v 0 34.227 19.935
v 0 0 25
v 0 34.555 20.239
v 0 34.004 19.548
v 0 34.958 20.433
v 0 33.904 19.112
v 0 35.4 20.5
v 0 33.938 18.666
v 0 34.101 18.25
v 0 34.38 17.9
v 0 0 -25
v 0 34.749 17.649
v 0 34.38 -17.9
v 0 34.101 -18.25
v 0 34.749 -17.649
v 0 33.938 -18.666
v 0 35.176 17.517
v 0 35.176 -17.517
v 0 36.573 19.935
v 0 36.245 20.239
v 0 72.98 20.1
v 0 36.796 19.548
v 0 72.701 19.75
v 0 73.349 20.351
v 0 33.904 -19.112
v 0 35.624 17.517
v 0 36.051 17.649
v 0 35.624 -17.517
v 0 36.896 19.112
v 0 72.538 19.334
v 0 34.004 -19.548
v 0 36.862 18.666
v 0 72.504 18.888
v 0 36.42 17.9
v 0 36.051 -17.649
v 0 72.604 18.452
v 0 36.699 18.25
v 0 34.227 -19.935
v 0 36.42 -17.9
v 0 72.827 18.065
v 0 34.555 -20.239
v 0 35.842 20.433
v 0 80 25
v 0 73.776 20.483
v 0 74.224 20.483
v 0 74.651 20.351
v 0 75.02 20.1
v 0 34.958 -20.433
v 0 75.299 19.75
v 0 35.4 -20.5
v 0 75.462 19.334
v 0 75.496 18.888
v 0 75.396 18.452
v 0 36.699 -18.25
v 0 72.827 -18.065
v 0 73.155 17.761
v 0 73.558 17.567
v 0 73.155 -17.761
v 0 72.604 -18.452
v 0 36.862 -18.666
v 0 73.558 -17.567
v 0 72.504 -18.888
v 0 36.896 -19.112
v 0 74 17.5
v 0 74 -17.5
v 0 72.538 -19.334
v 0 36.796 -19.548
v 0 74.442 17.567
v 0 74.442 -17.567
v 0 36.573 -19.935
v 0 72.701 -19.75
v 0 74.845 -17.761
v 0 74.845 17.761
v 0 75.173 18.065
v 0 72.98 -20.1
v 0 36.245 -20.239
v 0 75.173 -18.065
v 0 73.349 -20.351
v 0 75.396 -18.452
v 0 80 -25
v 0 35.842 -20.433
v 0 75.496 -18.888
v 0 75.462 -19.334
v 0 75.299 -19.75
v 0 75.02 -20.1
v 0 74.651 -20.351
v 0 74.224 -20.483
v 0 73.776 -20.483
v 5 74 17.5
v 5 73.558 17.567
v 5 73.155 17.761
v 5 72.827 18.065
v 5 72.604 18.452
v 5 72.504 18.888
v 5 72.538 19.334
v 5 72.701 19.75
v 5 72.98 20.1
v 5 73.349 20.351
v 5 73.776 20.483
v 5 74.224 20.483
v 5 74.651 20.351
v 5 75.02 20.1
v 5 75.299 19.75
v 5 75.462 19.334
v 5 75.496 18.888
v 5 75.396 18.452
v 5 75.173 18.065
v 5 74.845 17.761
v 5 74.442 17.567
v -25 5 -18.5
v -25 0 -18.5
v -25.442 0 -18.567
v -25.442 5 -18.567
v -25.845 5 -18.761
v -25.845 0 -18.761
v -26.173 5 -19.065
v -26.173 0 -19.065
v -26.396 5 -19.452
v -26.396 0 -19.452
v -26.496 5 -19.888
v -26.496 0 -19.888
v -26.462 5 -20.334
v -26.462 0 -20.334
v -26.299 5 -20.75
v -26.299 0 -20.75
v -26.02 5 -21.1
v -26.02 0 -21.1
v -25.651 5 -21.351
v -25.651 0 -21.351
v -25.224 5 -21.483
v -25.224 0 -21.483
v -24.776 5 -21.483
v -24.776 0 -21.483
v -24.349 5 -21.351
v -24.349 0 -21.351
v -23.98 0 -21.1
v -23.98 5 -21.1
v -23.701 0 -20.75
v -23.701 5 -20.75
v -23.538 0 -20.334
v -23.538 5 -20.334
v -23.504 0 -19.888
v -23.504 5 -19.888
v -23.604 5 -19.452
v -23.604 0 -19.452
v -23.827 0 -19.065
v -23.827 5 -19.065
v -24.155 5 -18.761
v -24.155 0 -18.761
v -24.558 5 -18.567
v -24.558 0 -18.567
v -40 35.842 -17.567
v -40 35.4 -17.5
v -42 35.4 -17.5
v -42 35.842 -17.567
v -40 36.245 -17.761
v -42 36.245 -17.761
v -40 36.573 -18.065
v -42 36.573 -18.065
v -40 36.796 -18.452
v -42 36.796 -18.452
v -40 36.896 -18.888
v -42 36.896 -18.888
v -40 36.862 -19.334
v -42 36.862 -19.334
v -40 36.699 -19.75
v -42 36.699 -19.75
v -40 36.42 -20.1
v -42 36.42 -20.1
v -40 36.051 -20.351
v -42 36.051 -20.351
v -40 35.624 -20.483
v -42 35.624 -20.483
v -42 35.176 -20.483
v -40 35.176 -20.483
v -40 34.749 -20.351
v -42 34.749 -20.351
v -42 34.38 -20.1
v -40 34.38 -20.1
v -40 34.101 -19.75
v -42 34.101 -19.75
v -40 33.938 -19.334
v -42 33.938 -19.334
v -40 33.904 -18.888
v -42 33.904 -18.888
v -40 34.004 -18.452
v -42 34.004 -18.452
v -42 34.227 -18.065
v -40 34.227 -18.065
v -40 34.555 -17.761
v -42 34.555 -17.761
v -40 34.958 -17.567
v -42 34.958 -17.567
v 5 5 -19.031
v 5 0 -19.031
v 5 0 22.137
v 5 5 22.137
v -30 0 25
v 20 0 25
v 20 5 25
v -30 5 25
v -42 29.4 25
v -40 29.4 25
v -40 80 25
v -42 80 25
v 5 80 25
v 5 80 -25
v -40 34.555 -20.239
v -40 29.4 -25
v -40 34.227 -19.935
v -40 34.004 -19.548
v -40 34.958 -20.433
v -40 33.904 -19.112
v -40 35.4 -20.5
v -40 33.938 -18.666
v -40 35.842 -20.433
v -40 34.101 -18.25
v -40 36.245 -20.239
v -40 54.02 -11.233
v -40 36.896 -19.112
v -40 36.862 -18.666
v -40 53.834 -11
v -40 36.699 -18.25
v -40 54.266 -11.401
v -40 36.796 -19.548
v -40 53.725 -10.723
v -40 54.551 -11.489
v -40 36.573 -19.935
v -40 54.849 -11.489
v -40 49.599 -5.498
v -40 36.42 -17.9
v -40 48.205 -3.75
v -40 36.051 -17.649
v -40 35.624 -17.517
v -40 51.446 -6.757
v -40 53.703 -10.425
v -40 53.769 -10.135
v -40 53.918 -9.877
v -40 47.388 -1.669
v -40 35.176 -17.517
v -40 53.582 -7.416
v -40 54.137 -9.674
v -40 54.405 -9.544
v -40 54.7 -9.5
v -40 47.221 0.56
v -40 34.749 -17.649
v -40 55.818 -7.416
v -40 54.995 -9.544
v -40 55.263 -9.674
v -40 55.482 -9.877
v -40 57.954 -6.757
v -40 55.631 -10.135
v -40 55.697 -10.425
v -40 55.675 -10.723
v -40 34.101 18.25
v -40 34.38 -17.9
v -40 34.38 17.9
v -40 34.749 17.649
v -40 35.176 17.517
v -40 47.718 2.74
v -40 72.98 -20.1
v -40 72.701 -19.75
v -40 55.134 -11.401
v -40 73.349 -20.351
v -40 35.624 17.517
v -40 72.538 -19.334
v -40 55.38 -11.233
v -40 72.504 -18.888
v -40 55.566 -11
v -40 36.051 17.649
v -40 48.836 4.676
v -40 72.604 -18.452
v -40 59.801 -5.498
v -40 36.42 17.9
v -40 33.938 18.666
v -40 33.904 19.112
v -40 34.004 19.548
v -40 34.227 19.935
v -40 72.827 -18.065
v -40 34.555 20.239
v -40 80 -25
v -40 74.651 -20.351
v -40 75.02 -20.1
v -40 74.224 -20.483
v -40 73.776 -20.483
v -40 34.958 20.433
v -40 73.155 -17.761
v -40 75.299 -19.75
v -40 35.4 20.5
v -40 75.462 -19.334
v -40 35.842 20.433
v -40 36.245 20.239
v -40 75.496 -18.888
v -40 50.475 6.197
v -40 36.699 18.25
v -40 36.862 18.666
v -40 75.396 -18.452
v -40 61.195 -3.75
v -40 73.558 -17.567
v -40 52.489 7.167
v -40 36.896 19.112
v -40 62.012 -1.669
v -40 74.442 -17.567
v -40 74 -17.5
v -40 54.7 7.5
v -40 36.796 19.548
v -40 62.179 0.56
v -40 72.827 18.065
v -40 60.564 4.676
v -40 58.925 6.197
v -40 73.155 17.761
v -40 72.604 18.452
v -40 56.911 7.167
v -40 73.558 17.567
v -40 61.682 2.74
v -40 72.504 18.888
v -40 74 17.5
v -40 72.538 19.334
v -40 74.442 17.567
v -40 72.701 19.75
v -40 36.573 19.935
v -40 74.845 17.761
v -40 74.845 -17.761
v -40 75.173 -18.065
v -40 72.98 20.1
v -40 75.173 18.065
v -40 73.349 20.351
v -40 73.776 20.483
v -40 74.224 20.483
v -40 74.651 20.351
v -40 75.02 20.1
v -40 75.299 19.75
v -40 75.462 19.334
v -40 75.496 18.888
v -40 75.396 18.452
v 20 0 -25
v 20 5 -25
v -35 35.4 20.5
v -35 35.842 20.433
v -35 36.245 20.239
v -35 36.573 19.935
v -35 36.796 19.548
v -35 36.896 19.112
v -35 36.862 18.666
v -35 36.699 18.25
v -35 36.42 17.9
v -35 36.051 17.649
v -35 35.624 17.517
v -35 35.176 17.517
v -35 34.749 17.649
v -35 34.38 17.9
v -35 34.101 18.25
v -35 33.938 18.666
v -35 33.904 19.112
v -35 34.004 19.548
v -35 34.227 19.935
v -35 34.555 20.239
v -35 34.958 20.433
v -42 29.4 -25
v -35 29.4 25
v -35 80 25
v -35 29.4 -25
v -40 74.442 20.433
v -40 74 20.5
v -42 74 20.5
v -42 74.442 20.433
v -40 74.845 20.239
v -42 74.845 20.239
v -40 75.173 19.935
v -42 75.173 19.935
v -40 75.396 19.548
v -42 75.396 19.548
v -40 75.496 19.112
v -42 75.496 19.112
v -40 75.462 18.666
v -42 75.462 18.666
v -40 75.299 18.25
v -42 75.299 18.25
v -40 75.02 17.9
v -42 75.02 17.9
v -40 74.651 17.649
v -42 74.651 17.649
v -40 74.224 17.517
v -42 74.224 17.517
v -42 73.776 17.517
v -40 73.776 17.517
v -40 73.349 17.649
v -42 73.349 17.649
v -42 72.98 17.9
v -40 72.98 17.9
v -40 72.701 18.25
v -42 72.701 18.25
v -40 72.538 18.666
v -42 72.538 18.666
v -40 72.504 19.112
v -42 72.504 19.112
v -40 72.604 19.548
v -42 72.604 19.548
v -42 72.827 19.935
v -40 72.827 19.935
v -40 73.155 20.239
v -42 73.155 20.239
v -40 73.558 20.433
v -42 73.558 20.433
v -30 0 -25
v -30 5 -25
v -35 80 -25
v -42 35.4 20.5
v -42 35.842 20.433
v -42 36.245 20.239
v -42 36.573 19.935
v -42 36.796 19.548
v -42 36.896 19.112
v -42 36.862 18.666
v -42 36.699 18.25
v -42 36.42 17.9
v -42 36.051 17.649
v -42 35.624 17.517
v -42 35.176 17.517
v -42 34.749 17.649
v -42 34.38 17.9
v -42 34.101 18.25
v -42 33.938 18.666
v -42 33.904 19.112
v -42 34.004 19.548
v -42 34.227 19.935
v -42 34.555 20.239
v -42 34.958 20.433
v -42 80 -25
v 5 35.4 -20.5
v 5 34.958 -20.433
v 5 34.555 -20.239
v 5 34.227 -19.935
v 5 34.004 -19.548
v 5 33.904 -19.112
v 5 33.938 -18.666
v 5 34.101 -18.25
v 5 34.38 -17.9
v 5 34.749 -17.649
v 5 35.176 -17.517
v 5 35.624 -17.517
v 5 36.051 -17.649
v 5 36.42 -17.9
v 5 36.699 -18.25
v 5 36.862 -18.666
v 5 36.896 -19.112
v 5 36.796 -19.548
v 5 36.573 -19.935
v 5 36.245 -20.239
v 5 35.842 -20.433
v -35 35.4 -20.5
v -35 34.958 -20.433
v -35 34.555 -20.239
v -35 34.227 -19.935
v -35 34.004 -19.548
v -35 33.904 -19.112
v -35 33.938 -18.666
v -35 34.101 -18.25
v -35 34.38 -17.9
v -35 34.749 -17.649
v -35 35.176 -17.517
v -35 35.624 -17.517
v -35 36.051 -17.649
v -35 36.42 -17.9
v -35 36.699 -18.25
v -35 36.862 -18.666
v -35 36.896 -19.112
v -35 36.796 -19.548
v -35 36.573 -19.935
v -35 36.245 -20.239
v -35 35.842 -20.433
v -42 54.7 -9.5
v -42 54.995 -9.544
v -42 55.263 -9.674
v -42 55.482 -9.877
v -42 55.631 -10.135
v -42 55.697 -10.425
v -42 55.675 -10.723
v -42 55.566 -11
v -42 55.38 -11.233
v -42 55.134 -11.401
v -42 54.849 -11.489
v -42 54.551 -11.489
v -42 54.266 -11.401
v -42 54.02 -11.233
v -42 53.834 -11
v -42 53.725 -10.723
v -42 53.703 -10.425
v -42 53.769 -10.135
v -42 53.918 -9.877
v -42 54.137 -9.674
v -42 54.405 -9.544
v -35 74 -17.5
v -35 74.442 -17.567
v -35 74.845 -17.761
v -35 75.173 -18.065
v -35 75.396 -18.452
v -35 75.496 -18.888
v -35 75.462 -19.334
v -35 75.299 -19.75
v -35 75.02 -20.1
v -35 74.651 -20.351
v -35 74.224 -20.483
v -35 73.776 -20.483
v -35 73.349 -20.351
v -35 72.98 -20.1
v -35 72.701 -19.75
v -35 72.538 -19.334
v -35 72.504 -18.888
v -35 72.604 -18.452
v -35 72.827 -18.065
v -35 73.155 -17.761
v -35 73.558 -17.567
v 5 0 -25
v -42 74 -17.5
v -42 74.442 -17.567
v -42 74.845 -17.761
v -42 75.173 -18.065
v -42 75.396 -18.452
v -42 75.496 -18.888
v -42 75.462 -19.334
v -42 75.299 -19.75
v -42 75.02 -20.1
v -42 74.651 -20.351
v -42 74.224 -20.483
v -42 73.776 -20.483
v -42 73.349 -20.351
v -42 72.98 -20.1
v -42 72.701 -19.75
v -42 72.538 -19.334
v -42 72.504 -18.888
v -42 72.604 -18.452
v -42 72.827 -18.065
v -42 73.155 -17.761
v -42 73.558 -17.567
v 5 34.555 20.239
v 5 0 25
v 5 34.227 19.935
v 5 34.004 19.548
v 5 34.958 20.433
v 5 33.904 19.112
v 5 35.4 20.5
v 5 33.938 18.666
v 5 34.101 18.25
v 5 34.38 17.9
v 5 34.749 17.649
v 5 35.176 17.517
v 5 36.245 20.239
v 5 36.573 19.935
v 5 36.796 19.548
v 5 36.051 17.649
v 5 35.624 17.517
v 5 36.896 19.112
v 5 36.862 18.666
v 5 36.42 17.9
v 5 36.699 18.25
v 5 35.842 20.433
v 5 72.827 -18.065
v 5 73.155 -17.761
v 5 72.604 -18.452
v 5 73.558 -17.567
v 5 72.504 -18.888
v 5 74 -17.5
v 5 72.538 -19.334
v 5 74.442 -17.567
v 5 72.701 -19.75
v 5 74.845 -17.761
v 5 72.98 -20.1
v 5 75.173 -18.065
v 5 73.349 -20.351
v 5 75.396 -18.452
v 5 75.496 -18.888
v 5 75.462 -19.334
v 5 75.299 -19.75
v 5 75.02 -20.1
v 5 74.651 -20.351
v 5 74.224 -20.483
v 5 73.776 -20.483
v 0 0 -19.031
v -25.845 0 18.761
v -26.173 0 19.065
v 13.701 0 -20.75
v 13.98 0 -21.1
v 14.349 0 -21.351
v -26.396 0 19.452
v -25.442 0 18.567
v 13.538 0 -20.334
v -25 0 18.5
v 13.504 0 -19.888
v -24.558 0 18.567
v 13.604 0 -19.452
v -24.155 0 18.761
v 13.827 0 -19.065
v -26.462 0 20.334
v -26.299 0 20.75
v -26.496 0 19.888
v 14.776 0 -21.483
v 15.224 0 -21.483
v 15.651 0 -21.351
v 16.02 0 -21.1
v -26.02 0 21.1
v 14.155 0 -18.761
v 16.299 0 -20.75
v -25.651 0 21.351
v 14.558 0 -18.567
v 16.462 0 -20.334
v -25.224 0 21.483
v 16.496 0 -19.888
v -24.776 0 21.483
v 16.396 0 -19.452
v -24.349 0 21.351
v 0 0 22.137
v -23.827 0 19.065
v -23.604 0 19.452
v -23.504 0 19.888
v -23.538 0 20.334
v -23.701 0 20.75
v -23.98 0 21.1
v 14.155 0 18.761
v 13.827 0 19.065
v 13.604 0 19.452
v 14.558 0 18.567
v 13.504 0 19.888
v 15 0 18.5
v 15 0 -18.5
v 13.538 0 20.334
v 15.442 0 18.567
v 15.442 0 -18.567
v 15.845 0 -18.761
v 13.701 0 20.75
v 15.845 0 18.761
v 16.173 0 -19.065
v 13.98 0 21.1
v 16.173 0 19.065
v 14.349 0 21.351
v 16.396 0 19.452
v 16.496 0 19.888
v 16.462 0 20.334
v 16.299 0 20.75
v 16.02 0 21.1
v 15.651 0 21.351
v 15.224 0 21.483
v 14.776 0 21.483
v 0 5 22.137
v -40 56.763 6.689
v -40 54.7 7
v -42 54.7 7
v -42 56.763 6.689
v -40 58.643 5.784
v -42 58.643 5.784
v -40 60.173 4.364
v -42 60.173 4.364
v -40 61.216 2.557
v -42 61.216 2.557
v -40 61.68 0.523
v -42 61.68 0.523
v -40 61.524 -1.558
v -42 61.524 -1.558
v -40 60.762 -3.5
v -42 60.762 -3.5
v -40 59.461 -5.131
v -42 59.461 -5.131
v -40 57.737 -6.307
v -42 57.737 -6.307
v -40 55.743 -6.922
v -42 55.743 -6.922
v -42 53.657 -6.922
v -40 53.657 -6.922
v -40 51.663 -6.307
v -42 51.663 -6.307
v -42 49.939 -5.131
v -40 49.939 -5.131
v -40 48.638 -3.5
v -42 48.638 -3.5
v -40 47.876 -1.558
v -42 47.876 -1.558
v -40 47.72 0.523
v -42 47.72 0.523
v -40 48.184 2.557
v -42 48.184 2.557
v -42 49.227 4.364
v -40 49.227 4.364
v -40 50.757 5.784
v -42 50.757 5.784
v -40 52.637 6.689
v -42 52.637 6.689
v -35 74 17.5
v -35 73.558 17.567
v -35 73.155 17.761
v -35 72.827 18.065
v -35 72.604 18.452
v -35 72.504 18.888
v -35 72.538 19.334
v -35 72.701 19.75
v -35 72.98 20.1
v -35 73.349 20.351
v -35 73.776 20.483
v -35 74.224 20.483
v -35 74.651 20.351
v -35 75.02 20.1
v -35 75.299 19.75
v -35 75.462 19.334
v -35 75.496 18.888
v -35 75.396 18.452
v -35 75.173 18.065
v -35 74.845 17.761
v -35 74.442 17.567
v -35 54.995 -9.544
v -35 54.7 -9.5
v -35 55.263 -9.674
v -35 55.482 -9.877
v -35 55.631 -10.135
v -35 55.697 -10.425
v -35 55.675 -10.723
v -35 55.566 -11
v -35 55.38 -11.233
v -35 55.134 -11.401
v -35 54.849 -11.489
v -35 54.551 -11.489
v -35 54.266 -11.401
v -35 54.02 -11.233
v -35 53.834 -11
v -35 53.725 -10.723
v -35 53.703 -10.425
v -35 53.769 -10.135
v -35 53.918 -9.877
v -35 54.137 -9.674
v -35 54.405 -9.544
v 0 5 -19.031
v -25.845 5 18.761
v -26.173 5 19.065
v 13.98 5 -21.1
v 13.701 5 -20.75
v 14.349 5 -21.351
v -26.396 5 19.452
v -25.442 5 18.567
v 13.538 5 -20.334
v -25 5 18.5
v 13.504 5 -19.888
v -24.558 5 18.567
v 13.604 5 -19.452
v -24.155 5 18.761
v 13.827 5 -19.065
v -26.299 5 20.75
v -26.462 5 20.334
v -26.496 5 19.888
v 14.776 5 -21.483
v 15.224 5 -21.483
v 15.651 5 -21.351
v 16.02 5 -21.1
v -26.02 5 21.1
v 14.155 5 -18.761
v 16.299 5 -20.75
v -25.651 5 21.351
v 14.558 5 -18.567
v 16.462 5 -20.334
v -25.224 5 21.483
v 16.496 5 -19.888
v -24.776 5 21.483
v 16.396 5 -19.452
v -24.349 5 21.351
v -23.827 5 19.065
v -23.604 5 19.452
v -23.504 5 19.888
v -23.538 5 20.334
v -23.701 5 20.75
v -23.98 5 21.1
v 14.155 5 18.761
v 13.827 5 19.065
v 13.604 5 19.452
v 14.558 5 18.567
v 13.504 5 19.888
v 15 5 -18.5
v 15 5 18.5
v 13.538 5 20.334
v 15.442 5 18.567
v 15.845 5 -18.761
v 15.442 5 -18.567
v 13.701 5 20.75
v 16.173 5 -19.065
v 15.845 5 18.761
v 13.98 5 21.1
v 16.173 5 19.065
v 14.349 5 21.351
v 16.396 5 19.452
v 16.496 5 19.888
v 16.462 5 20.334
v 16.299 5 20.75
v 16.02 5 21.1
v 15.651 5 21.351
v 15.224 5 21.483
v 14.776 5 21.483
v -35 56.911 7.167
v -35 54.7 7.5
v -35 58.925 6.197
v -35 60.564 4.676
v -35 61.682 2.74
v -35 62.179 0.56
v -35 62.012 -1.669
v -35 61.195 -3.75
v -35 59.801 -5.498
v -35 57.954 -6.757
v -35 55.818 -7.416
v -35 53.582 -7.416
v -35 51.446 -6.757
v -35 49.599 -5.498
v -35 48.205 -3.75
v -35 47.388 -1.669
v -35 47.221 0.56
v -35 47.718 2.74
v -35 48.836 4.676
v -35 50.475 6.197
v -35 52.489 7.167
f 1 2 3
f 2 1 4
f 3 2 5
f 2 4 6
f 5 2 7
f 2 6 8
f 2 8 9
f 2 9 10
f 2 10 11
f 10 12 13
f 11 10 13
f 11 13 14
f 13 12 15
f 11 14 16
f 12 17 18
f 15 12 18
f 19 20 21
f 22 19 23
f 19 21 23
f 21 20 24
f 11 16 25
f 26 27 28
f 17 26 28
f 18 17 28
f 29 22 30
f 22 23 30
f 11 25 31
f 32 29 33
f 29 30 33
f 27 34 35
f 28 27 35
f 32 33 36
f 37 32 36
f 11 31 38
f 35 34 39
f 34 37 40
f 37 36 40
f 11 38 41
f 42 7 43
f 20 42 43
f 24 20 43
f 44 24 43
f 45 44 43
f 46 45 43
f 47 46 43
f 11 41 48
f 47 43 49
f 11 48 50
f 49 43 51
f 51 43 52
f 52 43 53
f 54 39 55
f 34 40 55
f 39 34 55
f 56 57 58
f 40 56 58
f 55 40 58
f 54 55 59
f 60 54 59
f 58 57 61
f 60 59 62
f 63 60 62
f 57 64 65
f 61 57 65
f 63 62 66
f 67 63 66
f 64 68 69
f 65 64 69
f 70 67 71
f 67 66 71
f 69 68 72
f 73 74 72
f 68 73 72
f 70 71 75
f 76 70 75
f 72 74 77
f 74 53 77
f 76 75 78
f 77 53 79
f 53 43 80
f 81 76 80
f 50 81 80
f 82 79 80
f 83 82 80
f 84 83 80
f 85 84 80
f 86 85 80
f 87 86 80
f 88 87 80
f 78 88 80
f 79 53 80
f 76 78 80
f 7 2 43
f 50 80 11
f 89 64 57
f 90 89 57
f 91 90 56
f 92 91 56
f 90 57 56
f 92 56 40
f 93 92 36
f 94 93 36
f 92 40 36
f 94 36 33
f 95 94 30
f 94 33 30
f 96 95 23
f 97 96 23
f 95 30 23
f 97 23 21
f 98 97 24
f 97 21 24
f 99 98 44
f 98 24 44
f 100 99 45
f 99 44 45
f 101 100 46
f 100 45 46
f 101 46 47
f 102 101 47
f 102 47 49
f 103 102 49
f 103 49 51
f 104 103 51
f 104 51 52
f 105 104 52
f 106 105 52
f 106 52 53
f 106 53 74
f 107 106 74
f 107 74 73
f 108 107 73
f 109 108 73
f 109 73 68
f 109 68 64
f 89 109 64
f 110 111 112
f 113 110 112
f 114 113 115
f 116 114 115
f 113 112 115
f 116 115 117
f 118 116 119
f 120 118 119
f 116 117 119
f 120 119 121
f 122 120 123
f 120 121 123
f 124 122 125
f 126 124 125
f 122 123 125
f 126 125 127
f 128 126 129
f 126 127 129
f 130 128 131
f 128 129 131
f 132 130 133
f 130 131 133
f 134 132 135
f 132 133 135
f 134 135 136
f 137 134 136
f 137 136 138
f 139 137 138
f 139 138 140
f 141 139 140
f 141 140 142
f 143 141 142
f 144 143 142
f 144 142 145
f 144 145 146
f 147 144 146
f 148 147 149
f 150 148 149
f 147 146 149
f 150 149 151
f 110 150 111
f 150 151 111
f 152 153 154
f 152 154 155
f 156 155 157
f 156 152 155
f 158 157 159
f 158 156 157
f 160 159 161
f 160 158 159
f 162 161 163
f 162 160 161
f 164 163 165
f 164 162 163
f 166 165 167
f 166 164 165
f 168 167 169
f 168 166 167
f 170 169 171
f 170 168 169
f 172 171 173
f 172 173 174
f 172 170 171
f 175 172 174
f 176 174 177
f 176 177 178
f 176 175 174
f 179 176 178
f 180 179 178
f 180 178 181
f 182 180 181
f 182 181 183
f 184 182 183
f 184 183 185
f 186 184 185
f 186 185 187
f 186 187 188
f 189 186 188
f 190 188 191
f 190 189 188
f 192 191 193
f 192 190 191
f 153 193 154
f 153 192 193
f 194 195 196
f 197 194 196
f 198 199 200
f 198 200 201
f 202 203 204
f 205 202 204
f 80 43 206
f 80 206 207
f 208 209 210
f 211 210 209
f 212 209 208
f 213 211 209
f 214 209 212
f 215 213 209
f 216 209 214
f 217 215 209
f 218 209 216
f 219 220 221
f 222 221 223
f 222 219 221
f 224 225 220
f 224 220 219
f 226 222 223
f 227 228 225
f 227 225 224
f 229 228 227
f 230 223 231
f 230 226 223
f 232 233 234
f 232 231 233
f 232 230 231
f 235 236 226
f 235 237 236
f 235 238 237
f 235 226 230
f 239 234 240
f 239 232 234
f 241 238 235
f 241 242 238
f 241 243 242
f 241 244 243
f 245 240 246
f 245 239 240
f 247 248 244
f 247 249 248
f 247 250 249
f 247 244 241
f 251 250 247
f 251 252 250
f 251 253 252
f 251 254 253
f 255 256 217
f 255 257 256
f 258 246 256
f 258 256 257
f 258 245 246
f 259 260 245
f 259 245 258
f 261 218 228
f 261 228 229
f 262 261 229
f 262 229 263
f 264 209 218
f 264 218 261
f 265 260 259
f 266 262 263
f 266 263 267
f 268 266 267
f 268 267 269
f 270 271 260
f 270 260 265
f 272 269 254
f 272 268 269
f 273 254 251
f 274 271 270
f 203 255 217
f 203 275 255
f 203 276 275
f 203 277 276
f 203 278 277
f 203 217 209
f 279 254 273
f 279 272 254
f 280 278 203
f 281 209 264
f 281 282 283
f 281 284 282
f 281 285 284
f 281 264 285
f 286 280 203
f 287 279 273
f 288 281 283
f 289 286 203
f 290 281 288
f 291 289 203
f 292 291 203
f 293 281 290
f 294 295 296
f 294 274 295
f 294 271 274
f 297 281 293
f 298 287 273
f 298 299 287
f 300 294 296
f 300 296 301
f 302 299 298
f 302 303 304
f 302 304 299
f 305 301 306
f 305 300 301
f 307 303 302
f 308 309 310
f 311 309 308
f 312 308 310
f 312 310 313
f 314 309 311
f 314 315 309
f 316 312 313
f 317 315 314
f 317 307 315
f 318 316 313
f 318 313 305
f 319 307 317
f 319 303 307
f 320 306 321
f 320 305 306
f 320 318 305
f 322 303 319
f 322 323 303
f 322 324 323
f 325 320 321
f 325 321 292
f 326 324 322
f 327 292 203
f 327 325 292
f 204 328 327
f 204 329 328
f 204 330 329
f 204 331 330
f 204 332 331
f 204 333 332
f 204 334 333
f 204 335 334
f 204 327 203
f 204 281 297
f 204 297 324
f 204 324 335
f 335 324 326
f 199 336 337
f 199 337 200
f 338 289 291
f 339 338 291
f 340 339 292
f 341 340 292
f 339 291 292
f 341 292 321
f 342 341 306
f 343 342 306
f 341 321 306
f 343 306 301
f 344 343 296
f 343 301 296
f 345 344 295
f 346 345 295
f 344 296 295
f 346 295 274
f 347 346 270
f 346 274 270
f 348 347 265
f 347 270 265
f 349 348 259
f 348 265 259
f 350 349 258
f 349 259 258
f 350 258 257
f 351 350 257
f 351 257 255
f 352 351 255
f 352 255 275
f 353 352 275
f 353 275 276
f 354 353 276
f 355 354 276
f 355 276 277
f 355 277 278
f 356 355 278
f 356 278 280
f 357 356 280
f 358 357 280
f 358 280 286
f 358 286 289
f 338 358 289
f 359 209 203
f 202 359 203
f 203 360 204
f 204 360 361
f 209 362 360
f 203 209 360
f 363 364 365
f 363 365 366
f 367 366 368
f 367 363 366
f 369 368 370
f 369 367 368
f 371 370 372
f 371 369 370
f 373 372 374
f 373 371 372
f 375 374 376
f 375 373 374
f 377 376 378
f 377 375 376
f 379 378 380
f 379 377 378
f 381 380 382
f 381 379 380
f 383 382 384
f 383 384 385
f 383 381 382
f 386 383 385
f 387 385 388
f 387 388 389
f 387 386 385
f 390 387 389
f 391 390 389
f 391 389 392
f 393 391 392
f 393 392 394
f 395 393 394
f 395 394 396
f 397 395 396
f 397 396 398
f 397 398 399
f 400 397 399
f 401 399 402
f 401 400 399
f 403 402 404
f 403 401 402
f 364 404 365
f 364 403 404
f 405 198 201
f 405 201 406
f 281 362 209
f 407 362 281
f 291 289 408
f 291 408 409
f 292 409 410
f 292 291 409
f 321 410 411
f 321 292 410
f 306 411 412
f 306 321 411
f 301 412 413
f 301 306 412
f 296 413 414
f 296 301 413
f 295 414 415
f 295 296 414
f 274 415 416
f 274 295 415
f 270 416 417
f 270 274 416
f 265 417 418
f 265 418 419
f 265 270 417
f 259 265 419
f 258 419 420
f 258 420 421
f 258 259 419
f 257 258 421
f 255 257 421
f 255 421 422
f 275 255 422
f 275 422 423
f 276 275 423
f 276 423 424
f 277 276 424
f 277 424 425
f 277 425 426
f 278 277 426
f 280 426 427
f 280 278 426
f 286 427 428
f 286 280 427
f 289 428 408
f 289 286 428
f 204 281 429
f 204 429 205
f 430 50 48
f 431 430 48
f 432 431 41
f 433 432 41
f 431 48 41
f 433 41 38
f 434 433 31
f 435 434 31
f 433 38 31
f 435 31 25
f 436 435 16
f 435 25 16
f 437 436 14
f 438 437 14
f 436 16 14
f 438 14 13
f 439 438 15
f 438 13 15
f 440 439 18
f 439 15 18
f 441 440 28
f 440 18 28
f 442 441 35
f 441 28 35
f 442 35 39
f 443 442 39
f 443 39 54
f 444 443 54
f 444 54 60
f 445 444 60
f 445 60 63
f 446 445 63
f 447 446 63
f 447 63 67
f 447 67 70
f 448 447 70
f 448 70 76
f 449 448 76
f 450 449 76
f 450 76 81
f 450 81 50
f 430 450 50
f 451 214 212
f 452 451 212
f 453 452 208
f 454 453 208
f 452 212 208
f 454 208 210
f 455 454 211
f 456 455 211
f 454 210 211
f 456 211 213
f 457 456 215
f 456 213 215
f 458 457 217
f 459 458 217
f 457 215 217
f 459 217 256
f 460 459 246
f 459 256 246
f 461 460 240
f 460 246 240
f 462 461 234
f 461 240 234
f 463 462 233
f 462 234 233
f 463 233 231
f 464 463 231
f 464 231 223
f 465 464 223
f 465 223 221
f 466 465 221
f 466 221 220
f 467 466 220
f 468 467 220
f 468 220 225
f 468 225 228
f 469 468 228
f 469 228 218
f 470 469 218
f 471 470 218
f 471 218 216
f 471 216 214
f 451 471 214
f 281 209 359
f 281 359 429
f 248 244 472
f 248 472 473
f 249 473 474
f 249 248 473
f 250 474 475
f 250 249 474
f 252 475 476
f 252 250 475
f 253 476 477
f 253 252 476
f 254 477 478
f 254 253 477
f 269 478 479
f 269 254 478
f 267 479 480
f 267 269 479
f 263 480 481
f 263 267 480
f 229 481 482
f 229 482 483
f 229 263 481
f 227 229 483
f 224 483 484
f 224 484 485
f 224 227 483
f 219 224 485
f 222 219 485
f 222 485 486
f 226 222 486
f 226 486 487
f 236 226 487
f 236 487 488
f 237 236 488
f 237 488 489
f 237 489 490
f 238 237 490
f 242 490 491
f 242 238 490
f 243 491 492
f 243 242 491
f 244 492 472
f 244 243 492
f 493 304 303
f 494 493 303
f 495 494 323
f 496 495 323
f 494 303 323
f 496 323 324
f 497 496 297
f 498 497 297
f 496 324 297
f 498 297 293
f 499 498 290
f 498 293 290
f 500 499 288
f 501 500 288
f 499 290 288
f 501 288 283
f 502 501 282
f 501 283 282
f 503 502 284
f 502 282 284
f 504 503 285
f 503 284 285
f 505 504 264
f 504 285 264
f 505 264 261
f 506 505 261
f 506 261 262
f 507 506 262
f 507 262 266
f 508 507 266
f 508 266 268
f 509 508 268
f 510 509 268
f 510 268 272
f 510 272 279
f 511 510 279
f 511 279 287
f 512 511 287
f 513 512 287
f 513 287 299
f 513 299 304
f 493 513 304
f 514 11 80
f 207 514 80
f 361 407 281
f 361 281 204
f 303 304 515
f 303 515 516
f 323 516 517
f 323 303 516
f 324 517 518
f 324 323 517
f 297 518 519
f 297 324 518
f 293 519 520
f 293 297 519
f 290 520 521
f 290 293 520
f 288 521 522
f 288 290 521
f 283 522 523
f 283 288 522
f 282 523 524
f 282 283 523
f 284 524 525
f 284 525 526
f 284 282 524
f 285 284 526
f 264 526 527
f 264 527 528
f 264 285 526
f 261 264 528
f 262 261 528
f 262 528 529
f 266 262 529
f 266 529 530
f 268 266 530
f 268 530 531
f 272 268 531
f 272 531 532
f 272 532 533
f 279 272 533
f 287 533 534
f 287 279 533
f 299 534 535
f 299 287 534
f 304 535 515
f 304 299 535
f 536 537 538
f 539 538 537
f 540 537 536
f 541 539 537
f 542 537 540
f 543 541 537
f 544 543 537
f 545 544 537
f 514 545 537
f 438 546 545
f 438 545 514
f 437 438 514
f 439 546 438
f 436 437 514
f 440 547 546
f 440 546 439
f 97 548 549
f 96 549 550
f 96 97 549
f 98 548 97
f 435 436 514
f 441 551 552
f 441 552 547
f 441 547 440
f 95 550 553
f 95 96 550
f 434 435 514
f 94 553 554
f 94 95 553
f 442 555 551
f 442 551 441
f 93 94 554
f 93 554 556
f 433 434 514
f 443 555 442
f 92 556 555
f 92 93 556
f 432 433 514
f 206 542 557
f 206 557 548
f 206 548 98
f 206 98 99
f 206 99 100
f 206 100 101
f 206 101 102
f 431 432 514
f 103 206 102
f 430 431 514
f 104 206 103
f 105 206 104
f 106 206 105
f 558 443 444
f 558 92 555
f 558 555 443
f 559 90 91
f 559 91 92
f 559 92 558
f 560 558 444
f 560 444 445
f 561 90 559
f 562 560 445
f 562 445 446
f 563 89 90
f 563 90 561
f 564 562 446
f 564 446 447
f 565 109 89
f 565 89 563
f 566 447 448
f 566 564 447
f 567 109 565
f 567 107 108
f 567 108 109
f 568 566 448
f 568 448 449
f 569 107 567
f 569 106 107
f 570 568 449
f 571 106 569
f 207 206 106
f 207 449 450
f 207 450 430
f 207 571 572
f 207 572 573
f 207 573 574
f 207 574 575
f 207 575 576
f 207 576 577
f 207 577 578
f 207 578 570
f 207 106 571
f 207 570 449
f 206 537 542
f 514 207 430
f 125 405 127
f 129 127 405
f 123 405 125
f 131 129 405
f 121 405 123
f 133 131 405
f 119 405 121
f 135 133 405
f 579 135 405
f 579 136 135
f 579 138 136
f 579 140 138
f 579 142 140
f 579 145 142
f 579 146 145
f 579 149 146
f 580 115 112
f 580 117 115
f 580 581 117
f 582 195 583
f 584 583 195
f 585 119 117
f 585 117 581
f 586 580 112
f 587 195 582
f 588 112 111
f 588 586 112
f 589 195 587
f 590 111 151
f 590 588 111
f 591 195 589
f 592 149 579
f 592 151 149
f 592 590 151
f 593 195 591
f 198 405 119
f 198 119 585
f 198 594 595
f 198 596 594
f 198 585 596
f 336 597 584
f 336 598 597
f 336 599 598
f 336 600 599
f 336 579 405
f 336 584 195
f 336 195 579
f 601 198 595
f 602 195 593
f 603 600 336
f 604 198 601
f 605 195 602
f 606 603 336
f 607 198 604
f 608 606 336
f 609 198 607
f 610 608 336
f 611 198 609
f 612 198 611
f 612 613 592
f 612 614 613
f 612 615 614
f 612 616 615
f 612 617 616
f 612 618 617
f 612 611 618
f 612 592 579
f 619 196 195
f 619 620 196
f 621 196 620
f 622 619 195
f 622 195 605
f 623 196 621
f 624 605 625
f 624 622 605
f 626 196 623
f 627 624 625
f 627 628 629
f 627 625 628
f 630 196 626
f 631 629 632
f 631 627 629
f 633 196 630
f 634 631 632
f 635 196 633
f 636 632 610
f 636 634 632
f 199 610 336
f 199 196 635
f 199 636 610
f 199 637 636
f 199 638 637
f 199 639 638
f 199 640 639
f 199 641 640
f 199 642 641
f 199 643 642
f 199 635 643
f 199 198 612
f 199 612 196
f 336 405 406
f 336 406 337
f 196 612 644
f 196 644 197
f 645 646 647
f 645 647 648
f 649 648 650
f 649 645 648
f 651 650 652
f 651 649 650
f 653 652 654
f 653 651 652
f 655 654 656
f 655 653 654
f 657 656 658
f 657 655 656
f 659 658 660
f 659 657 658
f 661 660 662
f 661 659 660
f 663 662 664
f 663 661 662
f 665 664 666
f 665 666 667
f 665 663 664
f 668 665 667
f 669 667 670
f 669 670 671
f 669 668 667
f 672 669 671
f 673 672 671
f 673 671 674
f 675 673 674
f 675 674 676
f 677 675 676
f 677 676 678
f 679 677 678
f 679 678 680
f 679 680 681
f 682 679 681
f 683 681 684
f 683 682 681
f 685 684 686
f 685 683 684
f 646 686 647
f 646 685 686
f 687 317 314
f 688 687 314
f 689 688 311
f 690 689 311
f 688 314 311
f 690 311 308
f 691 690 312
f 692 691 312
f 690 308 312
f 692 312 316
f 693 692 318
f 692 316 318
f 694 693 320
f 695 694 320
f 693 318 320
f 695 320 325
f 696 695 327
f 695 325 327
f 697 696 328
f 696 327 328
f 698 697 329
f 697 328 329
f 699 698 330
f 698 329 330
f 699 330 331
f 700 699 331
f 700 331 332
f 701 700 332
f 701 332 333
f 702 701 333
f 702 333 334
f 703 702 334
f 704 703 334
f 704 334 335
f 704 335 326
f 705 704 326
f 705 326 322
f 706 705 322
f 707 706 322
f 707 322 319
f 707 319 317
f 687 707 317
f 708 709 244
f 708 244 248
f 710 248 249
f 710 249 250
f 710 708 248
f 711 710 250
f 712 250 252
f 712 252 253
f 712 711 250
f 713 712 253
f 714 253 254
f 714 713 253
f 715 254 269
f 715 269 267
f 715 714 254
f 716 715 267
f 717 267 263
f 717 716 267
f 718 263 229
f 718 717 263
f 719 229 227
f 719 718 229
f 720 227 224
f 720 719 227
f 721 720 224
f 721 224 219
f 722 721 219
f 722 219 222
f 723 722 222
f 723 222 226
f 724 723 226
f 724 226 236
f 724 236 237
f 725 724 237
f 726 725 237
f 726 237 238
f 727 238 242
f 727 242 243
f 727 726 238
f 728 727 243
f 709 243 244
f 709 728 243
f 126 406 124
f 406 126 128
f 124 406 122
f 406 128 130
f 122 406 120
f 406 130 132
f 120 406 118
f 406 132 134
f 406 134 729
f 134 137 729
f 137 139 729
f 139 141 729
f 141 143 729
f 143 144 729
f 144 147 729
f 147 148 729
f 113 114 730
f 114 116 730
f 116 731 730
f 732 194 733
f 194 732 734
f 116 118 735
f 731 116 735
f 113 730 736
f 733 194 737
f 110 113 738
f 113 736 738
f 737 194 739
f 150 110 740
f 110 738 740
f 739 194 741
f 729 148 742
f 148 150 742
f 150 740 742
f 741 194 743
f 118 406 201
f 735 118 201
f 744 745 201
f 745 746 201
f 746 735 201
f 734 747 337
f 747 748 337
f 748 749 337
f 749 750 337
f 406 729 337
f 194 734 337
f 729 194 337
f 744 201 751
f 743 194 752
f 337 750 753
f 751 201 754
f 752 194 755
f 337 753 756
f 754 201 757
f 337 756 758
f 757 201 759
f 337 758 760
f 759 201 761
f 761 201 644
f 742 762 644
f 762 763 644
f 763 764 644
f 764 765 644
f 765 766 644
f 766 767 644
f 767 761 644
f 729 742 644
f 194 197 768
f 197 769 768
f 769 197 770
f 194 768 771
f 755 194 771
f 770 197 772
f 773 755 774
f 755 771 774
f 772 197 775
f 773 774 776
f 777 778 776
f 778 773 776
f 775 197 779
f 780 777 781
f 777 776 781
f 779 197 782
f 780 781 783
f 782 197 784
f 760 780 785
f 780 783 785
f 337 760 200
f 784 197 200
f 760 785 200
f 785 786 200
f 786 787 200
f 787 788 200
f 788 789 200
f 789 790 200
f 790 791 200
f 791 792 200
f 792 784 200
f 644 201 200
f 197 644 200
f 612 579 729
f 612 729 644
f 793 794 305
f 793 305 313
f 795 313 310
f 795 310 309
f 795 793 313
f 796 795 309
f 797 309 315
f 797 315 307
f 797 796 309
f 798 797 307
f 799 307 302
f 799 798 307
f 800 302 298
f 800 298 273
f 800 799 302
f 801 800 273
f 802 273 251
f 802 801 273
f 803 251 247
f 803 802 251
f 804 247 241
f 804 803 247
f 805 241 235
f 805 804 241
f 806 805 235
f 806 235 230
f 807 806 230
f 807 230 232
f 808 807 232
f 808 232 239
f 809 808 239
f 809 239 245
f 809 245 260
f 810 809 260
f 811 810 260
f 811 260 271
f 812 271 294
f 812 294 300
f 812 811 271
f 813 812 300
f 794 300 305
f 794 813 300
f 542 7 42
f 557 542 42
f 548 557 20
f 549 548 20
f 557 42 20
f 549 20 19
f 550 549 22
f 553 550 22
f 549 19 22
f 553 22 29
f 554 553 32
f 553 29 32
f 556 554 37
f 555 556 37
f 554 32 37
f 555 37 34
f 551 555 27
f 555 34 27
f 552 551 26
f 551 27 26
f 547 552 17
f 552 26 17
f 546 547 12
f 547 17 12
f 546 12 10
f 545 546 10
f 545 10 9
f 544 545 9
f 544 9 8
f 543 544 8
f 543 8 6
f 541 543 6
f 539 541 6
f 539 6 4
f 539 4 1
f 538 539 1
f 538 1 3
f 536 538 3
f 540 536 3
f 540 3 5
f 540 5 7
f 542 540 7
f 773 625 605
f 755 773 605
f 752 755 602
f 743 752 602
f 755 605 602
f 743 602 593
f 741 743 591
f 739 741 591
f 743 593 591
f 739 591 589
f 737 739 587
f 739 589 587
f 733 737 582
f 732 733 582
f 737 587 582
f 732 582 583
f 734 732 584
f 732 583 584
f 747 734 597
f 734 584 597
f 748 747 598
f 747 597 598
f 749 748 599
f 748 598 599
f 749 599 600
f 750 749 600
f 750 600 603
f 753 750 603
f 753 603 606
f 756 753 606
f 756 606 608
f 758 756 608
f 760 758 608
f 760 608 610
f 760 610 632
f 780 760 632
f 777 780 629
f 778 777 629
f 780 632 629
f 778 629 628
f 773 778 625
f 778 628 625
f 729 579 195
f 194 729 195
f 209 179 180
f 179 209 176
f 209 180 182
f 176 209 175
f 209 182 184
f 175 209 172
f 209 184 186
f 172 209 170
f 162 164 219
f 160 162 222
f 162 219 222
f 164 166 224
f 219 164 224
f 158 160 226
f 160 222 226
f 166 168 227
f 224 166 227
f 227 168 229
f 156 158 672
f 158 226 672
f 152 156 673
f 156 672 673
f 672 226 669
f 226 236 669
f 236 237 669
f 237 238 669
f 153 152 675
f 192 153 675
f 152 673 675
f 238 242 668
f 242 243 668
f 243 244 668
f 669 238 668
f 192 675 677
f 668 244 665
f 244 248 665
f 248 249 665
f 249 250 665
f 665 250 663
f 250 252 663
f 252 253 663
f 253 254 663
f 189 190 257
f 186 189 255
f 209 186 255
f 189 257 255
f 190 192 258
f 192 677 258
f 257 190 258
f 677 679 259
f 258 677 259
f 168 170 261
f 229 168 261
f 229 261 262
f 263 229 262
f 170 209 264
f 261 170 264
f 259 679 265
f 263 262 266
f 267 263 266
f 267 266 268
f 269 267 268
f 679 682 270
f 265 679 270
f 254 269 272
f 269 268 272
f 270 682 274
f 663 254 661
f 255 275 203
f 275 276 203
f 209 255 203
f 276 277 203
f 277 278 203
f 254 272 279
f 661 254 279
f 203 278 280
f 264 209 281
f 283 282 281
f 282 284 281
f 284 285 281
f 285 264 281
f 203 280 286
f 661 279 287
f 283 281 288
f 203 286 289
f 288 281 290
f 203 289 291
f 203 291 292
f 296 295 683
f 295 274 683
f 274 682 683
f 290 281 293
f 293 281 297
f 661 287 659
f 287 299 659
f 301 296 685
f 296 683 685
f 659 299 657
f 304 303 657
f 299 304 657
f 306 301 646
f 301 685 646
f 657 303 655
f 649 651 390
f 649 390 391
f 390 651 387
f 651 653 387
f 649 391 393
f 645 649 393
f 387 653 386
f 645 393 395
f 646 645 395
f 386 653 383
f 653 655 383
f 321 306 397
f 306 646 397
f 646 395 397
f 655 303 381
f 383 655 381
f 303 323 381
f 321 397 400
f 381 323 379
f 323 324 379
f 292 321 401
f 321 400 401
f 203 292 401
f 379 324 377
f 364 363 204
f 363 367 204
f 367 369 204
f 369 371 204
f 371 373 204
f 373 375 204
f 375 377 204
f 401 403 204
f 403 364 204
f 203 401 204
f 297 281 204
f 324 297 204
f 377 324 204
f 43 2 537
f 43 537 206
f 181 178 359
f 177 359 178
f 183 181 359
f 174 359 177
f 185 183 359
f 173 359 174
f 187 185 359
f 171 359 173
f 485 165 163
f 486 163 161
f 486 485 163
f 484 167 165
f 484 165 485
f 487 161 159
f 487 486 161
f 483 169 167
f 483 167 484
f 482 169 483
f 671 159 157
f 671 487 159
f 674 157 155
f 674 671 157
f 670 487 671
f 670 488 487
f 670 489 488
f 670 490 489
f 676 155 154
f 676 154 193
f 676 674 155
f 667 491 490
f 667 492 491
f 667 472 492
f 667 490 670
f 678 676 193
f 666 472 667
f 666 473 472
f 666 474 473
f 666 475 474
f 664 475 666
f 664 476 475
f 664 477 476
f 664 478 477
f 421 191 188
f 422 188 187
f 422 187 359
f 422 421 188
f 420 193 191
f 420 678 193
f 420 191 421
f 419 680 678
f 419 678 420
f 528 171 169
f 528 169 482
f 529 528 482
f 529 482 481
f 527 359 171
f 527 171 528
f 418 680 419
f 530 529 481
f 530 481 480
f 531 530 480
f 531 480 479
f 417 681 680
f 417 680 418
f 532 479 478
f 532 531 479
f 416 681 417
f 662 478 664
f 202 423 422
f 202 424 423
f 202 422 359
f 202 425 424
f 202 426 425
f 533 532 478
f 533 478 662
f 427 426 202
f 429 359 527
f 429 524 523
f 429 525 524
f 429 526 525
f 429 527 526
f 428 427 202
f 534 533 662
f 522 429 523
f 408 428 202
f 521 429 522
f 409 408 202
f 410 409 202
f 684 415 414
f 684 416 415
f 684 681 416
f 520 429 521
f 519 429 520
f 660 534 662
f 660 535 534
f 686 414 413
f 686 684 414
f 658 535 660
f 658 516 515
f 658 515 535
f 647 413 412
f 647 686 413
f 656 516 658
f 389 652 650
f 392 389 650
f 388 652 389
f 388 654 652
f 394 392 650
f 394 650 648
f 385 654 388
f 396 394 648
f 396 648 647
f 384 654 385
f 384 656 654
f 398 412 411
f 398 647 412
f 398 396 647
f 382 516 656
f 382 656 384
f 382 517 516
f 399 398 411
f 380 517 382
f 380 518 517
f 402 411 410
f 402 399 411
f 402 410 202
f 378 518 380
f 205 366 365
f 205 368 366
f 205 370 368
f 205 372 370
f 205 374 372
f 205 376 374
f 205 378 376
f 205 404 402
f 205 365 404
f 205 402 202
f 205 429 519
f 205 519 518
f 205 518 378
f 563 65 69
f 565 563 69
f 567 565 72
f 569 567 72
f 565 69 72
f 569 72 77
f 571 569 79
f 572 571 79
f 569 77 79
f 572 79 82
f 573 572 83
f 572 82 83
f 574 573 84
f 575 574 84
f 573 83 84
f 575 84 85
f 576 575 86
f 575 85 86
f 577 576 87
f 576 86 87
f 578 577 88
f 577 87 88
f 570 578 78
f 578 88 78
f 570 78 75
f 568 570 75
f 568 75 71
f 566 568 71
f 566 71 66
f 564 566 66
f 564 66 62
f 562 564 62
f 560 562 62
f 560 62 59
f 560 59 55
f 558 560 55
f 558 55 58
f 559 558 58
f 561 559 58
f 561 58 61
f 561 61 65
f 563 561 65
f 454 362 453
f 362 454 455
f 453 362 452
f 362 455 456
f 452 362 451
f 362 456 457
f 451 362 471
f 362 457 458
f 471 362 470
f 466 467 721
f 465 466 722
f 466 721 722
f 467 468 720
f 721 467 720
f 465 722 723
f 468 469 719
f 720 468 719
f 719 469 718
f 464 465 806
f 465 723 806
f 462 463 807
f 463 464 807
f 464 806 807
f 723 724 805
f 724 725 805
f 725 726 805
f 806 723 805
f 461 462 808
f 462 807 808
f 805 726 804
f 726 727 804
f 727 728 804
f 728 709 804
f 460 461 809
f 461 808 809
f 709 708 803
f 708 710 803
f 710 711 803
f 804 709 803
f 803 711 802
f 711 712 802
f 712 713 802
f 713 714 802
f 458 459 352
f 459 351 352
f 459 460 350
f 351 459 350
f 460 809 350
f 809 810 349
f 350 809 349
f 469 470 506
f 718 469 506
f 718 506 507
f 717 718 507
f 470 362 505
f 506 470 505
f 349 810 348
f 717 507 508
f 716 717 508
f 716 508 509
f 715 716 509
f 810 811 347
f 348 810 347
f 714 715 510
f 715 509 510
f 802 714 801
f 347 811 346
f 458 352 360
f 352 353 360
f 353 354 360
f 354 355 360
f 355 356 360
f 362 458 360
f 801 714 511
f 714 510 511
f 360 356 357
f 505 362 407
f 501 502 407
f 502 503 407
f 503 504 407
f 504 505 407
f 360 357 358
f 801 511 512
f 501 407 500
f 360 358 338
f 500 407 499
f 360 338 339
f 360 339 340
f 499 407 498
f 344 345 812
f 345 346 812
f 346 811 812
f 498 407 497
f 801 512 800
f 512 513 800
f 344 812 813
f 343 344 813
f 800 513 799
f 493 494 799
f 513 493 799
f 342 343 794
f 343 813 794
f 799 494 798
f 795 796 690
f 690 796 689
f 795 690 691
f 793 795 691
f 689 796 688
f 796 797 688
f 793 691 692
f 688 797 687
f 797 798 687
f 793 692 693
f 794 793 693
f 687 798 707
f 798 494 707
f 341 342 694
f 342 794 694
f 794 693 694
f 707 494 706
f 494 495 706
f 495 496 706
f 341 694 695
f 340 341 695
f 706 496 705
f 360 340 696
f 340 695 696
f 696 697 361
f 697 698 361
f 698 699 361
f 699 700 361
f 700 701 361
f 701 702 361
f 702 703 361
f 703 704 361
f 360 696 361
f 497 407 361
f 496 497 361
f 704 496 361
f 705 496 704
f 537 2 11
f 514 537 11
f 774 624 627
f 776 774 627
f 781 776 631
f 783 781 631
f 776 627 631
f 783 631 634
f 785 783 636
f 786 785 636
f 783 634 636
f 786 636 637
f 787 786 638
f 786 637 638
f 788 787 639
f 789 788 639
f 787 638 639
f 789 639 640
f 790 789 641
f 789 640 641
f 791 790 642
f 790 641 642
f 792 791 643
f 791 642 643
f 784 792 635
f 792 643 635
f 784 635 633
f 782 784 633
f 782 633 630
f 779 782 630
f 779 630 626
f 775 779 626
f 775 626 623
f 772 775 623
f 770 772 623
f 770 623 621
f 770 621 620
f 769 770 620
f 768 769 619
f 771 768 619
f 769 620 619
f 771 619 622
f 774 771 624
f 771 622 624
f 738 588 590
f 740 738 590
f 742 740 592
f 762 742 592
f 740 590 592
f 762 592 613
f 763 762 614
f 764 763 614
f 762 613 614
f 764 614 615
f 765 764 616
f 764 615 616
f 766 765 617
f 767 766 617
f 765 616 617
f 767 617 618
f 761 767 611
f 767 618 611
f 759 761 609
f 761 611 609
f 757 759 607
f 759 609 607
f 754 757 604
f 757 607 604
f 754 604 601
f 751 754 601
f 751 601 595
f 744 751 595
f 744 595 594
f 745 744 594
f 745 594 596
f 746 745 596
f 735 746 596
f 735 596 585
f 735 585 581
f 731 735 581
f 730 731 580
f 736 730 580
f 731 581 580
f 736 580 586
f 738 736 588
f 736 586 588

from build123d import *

# Parameters (mm, degrees)
SKETCH2_W           = 50
SKETCH2_H           = 80
BOSS_EXTRUDE1_DEPTH = 5
SKETCH3_R           = 1.5
SKETCH3_W           = 5
SKETCH3_H           = 41.168947864
BOSS_EXTRUDE2_DEPTH = 5
SKETCH6_W           = 50
SKETCH6_H           = 50.6
SKETCH6_R           = 7.5
SKETCH6_R_2         = 1
BOSS_EXTRUDE3_DEPTH = 5
SKETCH7_R           = 1.5
CUT_EXTRUDE1_DEPTH  = 104.07764064
SKETCH8_W           = 50
SKETCH8_H           = 50.6
SKETCH8_R           = 1.5
SKETCH8_R_2         = 7
SKETCH8_R_3         = 1
BOSS_EXTRUDE4_DEPTH = 2


with BuildPart() as part:
    # Sketch2 → Boss-Extrude1 (new body)
    with BuildSketch(Plane(origin=(0, 0, 0), x_dir=(0, 0, -1), z_dir=(1, 0, 0))):
        with Locations((0, 40)):
            Rectangle(SKETCH2_W, SKETCH2_H)
    extrude(amount=BOSS_EXTRUDE1_DEPTH)


with BuildPart() as body_2:
    # Sketch3 → Boss-Extrude2 (new body)
    with BuildSketch(Plane.XZ):
        Polygon((0, 25), (-30, 25), (-30, -25), (0, -25), (20, -25), (20, 25), align=None)
        with Locations(Location((-25, 20, 0), (0, 0, 270))):
            Circle(SKETCH3_R, mode=Mode.SUBTRACT)
        with Locations(Location((15, 20, 0), (0, 0, 270))):
            Circle(SKETCH3_R, mode=Mode.SUBTRACT)
        with Locations(Location((15, -20, 0), (0, 0, 90))):
            Circle(SKETCH3_R, mode=Mode.SUBTRACT)
        with Locations(Location((-25, -20, 0), (0, 0, 90))):
            Circle(SKETCH3_R, mode=Mode.SUBTRACT)
        with Locations((2.5, 1.553000457)):
            Rectangle(SKETCH3_W, SKETCH3_H, mode=Mode.SUBTRACT)
    extrude(amount=-BOSS_EXTRUDE2_DEPTH)


with BuildPart() as body_3:
    # Sketch6 → Boss-Extrude3 (new body)
    with BuildSketch(Plane.ZY.offset(35)):
        with Locations((0, 54.7)):
            Rectangle(SKETCH6_W, SKETCH6_H)
        with Locations((0, 54.7)):
            Circle(SKETCH6_R, mode=Mode.SUBTRACT)
        with Locations((-10.5, 54.7)):
            Circle(SKETCH6_R_2, mode=Mode.SUBTRACT)
    extrude(amount=BOSS_EXTRUDE3_DEPTH)


with BuildPart() as cut_extrude1_tool:
    # Sketch7 → Cut-Extrude1 (new, through all)
    with BuildSketch(Plane.ZY.offset(40)):
        with Locations((-19, 74)):
            Circle(SKETCH7_R)
        with Locations(Location((19, 74, 0), (0, 0, 180))):
            Circle(SKETCH7_R)
        with Locations((19, 35.4)):
            Circle(SKETCH7_R)
        with Locations(Location((-19, 35.4, 0), (0, 0, 180))):
            Circle(SKETCH7_R)
    extrude(amount=-CUT_EXTRUDE1_DEPTH)


with BuildPart() as part_1:
    add(part.part)

    # Cut-Extrude1: cut by cut_extrude1_tool
    add(cut_extrude1_tool.part, mode=Mode.SUBTRACT)


with BuildPart() as body_3_1:
    add(body_3.part)

    # Cut-Extrude1: cut by cut_extrude1_tool
    add(cut_extrude1_tool.part, mode=Mode.SUBTRACT)


with BuildPart() as body_4:
    # Sketch8 → Boss-Extrude4 (new body)
    with BuildSketch(Plane.ZY.offset(40)):
        with Locations((0, 54.7)):
            Rectangle(SKETCH8_W, SKETCH8_H)
        with Locations((-19, 74)):
            Circle(SKETCH8_R, mode=Mode.SUBTRACT)
        with Locations((19, 74)):
            Circle(SKETCH8_R, mode=Mode.SUBTRACT)
        with Locations((19, 35.4)):
            Circle(SKETCH8_R, mode=Mode.SUBTRACT)
        with Locations((-19, 35.4)):
            Circle(SKETCH8_R, mode=Mode.SUBTRACT)
        with Locations((0, 54.7)):
            Circle(SKETCH8_R_2, mode=Mode.SUBTRACT)
        with Locations((-10.5, 54.7)):
            Circle(SKETCH8_R_3, mode=Mode.SUBTRACT)
    extrude(amount=BOSS_EXTRUDE4_DEPTH)


solid = Compound([body_2.part, part_1.part, body_3_1.part, body_4.part])
